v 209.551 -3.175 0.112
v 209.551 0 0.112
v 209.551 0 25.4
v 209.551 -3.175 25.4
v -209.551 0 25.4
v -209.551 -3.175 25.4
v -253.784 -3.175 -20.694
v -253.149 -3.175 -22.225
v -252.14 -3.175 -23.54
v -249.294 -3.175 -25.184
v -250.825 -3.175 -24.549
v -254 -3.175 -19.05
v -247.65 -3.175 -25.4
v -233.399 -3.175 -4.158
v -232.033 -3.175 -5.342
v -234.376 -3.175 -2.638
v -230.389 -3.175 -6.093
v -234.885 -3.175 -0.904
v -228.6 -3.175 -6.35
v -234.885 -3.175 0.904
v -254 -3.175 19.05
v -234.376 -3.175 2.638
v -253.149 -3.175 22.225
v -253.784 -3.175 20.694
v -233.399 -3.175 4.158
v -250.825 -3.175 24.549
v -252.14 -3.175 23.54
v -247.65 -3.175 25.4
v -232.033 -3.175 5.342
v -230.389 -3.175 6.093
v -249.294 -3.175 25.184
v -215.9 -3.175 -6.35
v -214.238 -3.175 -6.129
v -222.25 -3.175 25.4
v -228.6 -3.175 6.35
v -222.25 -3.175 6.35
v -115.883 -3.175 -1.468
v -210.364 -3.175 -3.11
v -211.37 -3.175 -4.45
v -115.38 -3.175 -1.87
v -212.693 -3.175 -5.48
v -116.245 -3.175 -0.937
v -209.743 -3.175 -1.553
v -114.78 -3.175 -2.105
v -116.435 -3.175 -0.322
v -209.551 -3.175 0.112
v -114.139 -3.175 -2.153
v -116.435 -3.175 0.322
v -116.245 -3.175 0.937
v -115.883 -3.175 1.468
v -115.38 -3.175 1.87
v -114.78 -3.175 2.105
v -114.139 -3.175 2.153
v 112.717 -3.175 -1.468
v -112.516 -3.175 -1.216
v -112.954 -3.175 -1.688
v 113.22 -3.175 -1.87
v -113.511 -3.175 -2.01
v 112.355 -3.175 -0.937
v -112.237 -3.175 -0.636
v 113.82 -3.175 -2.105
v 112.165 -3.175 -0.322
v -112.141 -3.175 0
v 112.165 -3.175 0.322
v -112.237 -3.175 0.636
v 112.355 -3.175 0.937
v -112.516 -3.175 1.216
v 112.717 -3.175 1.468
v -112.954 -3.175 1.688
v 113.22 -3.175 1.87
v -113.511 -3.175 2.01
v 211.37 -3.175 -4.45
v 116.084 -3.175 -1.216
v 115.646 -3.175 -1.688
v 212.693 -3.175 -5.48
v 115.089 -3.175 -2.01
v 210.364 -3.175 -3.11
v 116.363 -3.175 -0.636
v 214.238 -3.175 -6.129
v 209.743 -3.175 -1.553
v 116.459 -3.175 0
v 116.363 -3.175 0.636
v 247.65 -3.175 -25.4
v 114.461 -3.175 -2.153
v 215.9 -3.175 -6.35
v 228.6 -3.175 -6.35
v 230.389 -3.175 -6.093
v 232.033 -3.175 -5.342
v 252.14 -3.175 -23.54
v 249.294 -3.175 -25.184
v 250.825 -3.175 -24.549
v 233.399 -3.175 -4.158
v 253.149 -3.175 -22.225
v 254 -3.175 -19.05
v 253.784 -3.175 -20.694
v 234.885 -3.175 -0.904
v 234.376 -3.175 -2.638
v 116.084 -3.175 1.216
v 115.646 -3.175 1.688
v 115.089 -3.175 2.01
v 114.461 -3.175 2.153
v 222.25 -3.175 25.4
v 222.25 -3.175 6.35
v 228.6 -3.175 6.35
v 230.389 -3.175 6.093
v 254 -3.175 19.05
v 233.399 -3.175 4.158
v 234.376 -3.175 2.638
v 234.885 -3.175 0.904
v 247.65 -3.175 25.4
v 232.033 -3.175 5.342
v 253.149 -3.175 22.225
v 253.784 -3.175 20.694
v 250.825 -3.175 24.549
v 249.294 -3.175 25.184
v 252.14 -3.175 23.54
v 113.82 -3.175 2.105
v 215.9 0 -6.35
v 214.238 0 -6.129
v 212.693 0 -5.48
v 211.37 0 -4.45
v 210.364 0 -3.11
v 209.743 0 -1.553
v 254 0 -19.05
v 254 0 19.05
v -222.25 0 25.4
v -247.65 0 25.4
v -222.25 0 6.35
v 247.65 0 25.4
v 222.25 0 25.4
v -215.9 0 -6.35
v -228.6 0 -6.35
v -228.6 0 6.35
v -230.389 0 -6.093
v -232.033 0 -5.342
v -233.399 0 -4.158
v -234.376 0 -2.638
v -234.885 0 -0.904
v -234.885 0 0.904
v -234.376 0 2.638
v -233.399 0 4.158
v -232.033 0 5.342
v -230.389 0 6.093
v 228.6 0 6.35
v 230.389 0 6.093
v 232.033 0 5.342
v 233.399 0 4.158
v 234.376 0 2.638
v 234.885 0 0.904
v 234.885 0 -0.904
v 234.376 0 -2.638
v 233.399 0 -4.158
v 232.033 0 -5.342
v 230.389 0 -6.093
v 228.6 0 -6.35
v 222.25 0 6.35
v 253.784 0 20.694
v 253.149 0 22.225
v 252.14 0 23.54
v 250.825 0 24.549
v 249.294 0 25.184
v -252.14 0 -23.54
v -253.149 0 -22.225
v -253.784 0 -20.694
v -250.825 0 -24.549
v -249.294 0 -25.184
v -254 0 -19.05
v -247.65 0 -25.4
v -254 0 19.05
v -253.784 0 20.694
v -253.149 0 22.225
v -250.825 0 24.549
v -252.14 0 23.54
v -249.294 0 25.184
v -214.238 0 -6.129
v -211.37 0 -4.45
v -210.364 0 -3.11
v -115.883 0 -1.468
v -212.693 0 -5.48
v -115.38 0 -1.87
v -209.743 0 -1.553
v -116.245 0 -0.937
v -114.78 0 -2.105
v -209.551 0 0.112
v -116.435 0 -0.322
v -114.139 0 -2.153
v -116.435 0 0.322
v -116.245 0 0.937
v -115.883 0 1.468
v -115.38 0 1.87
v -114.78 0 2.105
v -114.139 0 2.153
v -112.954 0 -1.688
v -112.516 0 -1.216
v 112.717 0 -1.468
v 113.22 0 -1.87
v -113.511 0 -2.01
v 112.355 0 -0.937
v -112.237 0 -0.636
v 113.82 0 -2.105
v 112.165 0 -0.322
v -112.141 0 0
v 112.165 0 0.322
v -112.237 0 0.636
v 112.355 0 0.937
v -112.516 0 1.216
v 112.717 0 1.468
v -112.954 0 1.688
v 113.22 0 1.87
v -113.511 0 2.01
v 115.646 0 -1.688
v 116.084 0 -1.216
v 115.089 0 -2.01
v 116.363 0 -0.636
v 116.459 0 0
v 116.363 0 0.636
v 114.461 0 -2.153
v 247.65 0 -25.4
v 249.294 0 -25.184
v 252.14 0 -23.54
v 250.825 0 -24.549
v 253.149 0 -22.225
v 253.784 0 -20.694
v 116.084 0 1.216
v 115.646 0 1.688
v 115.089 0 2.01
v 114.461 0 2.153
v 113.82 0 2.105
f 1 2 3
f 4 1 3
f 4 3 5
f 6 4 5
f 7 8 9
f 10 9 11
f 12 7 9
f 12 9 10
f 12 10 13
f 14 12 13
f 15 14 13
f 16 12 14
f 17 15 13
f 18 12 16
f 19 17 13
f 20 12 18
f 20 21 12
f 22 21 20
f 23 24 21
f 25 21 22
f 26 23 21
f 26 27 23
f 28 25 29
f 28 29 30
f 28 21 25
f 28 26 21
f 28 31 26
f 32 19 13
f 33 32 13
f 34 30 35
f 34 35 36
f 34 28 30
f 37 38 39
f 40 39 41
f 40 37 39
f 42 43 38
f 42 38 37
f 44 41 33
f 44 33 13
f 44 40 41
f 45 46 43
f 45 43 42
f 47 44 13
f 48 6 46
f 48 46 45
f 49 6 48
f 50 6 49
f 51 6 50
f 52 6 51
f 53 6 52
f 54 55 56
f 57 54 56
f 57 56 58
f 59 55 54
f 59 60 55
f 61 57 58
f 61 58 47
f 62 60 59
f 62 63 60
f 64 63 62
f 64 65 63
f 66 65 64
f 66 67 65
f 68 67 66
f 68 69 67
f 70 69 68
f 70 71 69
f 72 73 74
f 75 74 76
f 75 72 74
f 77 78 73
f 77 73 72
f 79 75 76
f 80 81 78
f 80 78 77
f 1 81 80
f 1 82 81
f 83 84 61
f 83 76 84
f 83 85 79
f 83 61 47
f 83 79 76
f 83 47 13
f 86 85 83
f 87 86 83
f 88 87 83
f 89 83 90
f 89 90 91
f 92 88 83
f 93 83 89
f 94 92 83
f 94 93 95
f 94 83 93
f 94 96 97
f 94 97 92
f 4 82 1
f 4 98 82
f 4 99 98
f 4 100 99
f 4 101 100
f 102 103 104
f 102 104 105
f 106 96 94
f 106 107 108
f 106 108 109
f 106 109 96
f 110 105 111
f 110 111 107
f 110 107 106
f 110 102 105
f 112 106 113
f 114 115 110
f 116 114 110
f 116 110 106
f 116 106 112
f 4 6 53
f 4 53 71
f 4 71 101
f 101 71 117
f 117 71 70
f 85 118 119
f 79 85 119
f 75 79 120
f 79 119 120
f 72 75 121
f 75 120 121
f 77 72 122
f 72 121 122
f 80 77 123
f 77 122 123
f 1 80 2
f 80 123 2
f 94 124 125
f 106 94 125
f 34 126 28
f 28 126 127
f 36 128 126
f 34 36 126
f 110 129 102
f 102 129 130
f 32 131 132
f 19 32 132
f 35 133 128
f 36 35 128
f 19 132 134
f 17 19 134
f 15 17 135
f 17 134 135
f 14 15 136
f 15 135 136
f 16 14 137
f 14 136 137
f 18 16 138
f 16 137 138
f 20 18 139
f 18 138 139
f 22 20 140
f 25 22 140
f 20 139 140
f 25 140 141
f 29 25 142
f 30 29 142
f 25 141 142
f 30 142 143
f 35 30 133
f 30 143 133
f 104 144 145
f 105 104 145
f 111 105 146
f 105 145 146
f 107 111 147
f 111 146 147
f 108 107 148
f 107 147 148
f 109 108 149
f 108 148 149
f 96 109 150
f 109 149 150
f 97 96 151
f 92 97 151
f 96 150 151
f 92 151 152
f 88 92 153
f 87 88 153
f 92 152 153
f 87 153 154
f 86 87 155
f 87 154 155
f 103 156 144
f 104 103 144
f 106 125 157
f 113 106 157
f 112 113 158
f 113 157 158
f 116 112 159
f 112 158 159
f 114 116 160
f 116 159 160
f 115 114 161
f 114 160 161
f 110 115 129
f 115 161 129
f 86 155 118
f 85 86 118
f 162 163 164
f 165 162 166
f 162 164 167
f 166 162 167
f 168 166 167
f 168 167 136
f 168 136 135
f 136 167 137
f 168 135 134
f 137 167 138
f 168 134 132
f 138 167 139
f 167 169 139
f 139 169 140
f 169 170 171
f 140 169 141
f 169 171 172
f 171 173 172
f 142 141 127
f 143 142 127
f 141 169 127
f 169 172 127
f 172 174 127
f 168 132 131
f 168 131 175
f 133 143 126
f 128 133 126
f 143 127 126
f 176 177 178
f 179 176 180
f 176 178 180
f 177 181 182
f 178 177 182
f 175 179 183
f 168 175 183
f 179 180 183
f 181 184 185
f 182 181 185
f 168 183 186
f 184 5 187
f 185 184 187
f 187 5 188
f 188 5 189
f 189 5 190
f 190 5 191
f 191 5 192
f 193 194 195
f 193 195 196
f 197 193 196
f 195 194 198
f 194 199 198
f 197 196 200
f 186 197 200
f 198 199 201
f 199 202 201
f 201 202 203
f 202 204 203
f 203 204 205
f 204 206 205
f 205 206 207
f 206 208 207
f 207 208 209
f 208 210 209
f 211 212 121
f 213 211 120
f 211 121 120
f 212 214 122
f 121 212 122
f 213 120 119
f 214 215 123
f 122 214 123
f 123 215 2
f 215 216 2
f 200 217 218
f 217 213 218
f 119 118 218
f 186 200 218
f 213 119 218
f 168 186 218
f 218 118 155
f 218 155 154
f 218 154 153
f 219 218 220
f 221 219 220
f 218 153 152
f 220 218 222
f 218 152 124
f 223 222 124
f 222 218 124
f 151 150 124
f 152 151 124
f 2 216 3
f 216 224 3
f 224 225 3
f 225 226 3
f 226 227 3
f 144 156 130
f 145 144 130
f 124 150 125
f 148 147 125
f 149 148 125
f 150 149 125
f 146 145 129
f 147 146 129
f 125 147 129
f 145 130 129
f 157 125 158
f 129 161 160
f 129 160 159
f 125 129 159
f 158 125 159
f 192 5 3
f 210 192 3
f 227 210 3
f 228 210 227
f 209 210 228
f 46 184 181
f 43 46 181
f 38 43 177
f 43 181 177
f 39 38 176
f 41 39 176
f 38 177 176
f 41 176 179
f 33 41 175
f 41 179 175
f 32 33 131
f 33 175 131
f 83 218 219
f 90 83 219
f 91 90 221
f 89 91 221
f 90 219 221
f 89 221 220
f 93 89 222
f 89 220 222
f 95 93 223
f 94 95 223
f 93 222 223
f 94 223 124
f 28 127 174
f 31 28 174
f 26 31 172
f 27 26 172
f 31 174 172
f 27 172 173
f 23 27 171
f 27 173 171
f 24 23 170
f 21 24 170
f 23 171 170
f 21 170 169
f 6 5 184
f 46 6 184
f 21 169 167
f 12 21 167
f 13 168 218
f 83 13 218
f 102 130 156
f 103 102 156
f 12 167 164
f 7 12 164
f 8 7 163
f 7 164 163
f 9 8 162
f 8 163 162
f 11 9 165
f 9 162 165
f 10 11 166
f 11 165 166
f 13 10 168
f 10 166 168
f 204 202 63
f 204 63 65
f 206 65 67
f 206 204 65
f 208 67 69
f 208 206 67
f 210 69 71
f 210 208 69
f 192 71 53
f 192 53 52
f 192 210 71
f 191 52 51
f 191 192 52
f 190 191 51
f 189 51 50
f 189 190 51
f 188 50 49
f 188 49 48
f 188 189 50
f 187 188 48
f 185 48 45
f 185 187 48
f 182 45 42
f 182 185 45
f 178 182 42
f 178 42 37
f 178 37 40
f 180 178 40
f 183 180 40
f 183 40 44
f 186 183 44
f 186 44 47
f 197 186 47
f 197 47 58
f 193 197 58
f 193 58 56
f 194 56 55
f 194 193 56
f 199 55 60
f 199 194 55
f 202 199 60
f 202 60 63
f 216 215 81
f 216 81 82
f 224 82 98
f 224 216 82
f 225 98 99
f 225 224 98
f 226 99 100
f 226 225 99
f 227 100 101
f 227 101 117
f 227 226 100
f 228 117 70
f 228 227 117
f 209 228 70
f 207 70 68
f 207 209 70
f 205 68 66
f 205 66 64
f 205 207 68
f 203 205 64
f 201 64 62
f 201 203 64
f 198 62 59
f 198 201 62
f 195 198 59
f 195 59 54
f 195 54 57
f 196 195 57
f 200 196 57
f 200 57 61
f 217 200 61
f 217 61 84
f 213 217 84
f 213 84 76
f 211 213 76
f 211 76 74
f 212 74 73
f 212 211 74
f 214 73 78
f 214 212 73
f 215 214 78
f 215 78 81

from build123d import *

# Parameters (mm, degrees)
F0_R     = 2.159
F1_DEPTH = 3.175


with BuildPart() as f1:
    # F0 (on Front) → F1 (new body)
    with BuildSketch(Plane.XZ):
        with BuildLine():
            Line((-247.65, -25.4), (247.65, -25.4))
            ThreePointArc((247.65, -25.4), (252.140128, -23.540128), (254, -19.05))
            Line((254, -19.05), (254, 19.05))
            ThreePointArc((254, 19.05), (252.140128, 23.540128), (247.65, 25.4))
            Line((247.65, 25.4), (222.25, 25.4))
            Line((222.25, 25.4), (222.25, 6.35))
            Line((222.25, 6.35), (228.6, 6.35))
            ThreePointArc((228.6, 6.35), (234.95, 0), (228.6, -6.35))
            Line((228.6, -6.35), (215.9, -6.35))
            ThreePointArc((215.9, -6.35), (211.370438, -4.450345), (209.550988, 0.112025))
            Line((209.550988, 0.112025), (209.550988, 25.4))
            Line((209.550988, 25.4), (-209.550988, 25.4))
            Line((-209.550988, 25.4), (-209.550988, 0.112025))
            ThreePointArc((-209.550988, 0.112025), (-211.370438, -4.450345), (-215.9, -6.35))
            Line((-215.9, -6.35), (-228.6, -6.35))
            ThreePointArc((-228.6, -6.35), (-234.95, 0), (-228.6, 6.35))
            Line((-228.6, 6.35), (-222.25, 6.35))
            Line((-222.25, 6.35), (-222.25, 25.4))
            Line((-222.25, 25.4), (-247.65, 25.4))
            ThreePointArc((-247.65, 25.4), (-252.140128, 23.540128), (-254, 19.05))
            Line((-254, 19.05), (-254, -19.05))
            ThreePointArc((-254, -19.05), (-252.140128, -23.540128), (-247.65, -25.4))
        make_face()
        with Locations((-114.3, 0)):
            Circle(F0_R, mode=Mode.SUBTRACT)
        with Locations((114.3, 0)):
            Circle(F0_R, mode=Mode.SUBTRACT)
    extrude(amount=F1_DEPTH)


solid = f1.part
